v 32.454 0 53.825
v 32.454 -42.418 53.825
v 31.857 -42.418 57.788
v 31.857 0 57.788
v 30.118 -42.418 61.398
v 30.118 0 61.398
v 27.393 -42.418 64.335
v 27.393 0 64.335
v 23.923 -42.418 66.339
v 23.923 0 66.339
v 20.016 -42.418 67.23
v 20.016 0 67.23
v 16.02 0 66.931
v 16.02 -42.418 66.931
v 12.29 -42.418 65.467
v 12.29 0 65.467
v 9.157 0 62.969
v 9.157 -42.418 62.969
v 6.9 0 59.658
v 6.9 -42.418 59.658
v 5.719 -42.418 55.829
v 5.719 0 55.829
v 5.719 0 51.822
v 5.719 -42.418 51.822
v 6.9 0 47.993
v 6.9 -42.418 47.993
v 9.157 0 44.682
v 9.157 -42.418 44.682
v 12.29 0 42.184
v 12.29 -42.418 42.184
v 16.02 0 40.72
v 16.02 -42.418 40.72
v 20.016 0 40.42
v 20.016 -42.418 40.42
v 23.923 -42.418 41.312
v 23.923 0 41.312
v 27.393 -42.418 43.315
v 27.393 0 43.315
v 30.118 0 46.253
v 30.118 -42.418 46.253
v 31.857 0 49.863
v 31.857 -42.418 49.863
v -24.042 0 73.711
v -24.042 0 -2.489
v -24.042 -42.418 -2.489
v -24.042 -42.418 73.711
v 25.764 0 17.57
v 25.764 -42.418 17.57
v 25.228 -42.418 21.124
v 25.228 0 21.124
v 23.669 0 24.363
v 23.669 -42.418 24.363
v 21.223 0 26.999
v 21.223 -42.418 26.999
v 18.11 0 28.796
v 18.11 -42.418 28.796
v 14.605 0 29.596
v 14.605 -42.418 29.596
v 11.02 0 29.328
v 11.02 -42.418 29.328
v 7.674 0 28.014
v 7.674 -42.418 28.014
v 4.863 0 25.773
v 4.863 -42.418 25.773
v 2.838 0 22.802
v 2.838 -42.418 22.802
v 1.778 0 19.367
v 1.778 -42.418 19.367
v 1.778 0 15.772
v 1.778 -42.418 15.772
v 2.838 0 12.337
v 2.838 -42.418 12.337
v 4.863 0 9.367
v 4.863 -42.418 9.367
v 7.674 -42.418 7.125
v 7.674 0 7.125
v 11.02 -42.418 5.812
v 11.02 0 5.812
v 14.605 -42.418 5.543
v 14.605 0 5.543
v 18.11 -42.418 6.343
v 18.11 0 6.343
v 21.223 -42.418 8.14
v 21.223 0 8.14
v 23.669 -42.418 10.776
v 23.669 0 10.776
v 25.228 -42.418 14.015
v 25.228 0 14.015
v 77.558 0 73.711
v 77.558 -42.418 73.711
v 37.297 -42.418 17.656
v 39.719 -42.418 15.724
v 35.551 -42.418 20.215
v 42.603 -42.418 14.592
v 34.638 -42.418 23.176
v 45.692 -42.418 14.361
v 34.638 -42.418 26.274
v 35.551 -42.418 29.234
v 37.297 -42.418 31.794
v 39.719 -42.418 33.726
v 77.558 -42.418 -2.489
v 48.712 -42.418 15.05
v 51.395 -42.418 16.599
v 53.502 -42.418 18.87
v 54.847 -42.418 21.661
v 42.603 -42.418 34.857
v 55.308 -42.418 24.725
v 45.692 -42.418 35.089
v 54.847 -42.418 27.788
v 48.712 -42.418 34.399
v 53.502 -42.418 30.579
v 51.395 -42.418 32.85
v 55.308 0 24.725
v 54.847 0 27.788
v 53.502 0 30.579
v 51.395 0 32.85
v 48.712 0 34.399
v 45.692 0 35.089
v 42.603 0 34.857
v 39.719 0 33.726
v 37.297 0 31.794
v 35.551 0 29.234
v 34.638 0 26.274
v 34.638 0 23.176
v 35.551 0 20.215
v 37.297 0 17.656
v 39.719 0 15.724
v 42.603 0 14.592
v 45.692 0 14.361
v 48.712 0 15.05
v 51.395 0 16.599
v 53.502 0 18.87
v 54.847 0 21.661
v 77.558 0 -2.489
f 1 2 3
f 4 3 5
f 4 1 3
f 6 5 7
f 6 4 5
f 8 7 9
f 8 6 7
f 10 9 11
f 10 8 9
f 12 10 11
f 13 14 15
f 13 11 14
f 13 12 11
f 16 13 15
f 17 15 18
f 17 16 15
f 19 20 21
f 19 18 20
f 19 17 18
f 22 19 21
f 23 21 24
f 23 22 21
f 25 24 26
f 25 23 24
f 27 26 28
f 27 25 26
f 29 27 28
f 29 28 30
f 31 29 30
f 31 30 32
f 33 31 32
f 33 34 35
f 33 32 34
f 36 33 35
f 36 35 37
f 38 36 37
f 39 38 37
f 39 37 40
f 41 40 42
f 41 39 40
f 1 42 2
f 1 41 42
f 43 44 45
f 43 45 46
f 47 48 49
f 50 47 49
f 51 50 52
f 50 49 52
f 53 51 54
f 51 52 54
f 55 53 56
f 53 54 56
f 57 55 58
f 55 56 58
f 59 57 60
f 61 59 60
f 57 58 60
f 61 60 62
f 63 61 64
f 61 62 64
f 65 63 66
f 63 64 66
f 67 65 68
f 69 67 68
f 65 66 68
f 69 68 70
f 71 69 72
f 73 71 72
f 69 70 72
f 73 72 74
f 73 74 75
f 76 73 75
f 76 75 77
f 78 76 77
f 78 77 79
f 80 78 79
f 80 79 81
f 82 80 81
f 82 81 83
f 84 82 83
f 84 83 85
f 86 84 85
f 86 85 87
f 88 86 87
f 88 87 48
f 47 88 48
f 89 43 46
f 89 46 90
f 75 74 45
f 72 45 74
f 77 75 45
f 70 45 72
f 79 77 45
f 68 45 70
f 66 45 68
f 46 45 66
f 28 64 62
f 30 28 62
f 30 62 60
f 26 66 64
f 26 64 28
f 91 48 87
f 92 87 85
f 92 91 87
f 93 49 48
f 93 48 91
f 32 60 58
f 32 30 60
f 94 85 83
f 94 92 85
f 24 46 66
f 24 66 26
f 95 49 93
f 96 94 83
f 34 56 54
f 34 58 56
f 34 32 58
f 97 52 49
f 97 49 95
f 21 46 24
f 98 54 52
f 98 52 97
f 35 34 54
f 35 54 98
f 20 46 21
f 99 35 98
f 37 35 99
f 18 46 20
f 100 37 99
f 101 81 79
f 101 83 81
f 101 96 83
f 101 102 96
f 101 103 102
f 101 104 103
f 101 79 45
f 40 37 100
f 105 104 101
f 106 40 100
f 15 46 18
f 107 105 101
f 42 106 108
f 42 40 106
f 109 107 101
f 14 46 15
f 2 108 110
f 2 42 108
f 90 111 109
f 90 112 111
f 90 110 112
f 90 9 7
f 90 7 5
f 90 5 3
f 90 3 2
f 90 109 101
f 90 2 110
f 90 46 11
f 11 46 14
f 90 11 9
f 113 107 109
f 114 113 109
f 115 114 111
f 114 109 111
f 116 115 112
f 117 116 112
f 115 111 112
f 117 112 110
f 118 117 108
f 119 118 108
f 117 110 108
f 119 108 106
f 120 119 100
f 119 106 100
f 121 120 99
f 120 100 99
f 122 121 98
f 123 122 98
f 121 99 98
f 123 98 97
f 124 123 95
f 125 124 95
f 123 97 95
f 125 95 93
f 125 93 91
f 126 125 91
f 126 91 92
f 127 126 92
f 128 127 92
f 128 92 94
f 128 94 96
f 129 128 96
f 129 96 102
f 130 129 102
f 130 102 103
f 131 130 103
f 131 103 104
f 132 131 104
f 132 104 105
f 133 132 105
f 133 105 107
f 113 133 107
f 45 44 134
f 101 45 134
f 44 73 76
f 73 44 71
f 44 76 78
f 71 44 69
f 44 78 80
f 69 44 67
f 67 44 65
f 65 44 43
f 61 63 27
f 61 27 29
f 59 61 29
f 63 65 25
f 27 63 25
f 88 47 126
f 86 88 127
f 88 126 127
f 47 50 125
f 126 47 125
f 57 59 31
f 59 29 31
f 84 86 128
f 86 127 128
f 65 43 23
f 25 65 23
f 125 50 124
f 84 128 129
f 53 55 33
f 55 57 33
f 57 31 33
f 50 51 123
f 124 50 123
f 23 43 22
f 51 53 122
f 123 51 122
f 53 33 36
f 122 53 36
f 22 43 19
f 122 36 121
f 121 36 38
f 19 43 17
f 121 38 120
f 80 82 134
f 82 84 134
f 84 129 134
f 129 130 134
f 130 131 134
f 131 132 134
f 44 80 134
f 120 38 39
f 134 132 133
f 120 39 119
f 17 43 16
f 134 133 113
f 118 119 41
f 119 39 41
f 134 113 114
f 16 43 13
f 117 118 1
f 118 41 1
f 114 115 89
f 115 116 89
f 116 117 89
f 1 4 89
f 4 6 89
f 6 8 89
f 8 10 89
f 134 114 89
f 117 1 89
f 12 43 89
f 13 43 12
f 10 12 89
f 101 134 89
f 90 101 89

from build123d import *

# Parameters (mm, degrees)
F0_W     = 101.6
F0_H     = 76.2
F1_DEPTH = 42.418
F2_R     = 13.442601
F3_DEPTH = 67.564
F4_R     = 10.393123
F5_DEPTH = 93.218
F6_R     = 12.06034
F7_DEPTH = 66.548


with BuildPart() as f1:
    # F0 (on Front) → F1 (new body)
    with BuildSketch(Plane.XZ):
        with Locations((26.758161, 35.611203)):
            Rectangle(F0_W, F0_H)
    extrude(amount=F1_DEPTH)

    # F2 (on Front) → F3 (cut)
    with BuildSketch(Plane.XZ):
        with Locations((19.011559, 53.825341)):
            Circle(F2_R)
    extrude(amount=F3_DEPTH, mode=Mode.SUBTRACT)

    # F4 (on face) → F5 (cut)
    with BuildSketch(Plane.XZ.offset(42.418)):
        with Locations((44.915249, 24.72481)):
            Circle(F4_R)
    extrude(amount=-F5_DEPTH, mode=Mode.SUBTRACT)

    # F6 (on face) → F7 (cut)
    with BuildSketch(Plane.XZ.offset(42.418)):
        with Locations((13.703964, 17.569638)):
            Circle(F6_R)
    extrude(amount=-F7_DEPTH, mode=Mode.SUBTRACT)


solid = f1.part
